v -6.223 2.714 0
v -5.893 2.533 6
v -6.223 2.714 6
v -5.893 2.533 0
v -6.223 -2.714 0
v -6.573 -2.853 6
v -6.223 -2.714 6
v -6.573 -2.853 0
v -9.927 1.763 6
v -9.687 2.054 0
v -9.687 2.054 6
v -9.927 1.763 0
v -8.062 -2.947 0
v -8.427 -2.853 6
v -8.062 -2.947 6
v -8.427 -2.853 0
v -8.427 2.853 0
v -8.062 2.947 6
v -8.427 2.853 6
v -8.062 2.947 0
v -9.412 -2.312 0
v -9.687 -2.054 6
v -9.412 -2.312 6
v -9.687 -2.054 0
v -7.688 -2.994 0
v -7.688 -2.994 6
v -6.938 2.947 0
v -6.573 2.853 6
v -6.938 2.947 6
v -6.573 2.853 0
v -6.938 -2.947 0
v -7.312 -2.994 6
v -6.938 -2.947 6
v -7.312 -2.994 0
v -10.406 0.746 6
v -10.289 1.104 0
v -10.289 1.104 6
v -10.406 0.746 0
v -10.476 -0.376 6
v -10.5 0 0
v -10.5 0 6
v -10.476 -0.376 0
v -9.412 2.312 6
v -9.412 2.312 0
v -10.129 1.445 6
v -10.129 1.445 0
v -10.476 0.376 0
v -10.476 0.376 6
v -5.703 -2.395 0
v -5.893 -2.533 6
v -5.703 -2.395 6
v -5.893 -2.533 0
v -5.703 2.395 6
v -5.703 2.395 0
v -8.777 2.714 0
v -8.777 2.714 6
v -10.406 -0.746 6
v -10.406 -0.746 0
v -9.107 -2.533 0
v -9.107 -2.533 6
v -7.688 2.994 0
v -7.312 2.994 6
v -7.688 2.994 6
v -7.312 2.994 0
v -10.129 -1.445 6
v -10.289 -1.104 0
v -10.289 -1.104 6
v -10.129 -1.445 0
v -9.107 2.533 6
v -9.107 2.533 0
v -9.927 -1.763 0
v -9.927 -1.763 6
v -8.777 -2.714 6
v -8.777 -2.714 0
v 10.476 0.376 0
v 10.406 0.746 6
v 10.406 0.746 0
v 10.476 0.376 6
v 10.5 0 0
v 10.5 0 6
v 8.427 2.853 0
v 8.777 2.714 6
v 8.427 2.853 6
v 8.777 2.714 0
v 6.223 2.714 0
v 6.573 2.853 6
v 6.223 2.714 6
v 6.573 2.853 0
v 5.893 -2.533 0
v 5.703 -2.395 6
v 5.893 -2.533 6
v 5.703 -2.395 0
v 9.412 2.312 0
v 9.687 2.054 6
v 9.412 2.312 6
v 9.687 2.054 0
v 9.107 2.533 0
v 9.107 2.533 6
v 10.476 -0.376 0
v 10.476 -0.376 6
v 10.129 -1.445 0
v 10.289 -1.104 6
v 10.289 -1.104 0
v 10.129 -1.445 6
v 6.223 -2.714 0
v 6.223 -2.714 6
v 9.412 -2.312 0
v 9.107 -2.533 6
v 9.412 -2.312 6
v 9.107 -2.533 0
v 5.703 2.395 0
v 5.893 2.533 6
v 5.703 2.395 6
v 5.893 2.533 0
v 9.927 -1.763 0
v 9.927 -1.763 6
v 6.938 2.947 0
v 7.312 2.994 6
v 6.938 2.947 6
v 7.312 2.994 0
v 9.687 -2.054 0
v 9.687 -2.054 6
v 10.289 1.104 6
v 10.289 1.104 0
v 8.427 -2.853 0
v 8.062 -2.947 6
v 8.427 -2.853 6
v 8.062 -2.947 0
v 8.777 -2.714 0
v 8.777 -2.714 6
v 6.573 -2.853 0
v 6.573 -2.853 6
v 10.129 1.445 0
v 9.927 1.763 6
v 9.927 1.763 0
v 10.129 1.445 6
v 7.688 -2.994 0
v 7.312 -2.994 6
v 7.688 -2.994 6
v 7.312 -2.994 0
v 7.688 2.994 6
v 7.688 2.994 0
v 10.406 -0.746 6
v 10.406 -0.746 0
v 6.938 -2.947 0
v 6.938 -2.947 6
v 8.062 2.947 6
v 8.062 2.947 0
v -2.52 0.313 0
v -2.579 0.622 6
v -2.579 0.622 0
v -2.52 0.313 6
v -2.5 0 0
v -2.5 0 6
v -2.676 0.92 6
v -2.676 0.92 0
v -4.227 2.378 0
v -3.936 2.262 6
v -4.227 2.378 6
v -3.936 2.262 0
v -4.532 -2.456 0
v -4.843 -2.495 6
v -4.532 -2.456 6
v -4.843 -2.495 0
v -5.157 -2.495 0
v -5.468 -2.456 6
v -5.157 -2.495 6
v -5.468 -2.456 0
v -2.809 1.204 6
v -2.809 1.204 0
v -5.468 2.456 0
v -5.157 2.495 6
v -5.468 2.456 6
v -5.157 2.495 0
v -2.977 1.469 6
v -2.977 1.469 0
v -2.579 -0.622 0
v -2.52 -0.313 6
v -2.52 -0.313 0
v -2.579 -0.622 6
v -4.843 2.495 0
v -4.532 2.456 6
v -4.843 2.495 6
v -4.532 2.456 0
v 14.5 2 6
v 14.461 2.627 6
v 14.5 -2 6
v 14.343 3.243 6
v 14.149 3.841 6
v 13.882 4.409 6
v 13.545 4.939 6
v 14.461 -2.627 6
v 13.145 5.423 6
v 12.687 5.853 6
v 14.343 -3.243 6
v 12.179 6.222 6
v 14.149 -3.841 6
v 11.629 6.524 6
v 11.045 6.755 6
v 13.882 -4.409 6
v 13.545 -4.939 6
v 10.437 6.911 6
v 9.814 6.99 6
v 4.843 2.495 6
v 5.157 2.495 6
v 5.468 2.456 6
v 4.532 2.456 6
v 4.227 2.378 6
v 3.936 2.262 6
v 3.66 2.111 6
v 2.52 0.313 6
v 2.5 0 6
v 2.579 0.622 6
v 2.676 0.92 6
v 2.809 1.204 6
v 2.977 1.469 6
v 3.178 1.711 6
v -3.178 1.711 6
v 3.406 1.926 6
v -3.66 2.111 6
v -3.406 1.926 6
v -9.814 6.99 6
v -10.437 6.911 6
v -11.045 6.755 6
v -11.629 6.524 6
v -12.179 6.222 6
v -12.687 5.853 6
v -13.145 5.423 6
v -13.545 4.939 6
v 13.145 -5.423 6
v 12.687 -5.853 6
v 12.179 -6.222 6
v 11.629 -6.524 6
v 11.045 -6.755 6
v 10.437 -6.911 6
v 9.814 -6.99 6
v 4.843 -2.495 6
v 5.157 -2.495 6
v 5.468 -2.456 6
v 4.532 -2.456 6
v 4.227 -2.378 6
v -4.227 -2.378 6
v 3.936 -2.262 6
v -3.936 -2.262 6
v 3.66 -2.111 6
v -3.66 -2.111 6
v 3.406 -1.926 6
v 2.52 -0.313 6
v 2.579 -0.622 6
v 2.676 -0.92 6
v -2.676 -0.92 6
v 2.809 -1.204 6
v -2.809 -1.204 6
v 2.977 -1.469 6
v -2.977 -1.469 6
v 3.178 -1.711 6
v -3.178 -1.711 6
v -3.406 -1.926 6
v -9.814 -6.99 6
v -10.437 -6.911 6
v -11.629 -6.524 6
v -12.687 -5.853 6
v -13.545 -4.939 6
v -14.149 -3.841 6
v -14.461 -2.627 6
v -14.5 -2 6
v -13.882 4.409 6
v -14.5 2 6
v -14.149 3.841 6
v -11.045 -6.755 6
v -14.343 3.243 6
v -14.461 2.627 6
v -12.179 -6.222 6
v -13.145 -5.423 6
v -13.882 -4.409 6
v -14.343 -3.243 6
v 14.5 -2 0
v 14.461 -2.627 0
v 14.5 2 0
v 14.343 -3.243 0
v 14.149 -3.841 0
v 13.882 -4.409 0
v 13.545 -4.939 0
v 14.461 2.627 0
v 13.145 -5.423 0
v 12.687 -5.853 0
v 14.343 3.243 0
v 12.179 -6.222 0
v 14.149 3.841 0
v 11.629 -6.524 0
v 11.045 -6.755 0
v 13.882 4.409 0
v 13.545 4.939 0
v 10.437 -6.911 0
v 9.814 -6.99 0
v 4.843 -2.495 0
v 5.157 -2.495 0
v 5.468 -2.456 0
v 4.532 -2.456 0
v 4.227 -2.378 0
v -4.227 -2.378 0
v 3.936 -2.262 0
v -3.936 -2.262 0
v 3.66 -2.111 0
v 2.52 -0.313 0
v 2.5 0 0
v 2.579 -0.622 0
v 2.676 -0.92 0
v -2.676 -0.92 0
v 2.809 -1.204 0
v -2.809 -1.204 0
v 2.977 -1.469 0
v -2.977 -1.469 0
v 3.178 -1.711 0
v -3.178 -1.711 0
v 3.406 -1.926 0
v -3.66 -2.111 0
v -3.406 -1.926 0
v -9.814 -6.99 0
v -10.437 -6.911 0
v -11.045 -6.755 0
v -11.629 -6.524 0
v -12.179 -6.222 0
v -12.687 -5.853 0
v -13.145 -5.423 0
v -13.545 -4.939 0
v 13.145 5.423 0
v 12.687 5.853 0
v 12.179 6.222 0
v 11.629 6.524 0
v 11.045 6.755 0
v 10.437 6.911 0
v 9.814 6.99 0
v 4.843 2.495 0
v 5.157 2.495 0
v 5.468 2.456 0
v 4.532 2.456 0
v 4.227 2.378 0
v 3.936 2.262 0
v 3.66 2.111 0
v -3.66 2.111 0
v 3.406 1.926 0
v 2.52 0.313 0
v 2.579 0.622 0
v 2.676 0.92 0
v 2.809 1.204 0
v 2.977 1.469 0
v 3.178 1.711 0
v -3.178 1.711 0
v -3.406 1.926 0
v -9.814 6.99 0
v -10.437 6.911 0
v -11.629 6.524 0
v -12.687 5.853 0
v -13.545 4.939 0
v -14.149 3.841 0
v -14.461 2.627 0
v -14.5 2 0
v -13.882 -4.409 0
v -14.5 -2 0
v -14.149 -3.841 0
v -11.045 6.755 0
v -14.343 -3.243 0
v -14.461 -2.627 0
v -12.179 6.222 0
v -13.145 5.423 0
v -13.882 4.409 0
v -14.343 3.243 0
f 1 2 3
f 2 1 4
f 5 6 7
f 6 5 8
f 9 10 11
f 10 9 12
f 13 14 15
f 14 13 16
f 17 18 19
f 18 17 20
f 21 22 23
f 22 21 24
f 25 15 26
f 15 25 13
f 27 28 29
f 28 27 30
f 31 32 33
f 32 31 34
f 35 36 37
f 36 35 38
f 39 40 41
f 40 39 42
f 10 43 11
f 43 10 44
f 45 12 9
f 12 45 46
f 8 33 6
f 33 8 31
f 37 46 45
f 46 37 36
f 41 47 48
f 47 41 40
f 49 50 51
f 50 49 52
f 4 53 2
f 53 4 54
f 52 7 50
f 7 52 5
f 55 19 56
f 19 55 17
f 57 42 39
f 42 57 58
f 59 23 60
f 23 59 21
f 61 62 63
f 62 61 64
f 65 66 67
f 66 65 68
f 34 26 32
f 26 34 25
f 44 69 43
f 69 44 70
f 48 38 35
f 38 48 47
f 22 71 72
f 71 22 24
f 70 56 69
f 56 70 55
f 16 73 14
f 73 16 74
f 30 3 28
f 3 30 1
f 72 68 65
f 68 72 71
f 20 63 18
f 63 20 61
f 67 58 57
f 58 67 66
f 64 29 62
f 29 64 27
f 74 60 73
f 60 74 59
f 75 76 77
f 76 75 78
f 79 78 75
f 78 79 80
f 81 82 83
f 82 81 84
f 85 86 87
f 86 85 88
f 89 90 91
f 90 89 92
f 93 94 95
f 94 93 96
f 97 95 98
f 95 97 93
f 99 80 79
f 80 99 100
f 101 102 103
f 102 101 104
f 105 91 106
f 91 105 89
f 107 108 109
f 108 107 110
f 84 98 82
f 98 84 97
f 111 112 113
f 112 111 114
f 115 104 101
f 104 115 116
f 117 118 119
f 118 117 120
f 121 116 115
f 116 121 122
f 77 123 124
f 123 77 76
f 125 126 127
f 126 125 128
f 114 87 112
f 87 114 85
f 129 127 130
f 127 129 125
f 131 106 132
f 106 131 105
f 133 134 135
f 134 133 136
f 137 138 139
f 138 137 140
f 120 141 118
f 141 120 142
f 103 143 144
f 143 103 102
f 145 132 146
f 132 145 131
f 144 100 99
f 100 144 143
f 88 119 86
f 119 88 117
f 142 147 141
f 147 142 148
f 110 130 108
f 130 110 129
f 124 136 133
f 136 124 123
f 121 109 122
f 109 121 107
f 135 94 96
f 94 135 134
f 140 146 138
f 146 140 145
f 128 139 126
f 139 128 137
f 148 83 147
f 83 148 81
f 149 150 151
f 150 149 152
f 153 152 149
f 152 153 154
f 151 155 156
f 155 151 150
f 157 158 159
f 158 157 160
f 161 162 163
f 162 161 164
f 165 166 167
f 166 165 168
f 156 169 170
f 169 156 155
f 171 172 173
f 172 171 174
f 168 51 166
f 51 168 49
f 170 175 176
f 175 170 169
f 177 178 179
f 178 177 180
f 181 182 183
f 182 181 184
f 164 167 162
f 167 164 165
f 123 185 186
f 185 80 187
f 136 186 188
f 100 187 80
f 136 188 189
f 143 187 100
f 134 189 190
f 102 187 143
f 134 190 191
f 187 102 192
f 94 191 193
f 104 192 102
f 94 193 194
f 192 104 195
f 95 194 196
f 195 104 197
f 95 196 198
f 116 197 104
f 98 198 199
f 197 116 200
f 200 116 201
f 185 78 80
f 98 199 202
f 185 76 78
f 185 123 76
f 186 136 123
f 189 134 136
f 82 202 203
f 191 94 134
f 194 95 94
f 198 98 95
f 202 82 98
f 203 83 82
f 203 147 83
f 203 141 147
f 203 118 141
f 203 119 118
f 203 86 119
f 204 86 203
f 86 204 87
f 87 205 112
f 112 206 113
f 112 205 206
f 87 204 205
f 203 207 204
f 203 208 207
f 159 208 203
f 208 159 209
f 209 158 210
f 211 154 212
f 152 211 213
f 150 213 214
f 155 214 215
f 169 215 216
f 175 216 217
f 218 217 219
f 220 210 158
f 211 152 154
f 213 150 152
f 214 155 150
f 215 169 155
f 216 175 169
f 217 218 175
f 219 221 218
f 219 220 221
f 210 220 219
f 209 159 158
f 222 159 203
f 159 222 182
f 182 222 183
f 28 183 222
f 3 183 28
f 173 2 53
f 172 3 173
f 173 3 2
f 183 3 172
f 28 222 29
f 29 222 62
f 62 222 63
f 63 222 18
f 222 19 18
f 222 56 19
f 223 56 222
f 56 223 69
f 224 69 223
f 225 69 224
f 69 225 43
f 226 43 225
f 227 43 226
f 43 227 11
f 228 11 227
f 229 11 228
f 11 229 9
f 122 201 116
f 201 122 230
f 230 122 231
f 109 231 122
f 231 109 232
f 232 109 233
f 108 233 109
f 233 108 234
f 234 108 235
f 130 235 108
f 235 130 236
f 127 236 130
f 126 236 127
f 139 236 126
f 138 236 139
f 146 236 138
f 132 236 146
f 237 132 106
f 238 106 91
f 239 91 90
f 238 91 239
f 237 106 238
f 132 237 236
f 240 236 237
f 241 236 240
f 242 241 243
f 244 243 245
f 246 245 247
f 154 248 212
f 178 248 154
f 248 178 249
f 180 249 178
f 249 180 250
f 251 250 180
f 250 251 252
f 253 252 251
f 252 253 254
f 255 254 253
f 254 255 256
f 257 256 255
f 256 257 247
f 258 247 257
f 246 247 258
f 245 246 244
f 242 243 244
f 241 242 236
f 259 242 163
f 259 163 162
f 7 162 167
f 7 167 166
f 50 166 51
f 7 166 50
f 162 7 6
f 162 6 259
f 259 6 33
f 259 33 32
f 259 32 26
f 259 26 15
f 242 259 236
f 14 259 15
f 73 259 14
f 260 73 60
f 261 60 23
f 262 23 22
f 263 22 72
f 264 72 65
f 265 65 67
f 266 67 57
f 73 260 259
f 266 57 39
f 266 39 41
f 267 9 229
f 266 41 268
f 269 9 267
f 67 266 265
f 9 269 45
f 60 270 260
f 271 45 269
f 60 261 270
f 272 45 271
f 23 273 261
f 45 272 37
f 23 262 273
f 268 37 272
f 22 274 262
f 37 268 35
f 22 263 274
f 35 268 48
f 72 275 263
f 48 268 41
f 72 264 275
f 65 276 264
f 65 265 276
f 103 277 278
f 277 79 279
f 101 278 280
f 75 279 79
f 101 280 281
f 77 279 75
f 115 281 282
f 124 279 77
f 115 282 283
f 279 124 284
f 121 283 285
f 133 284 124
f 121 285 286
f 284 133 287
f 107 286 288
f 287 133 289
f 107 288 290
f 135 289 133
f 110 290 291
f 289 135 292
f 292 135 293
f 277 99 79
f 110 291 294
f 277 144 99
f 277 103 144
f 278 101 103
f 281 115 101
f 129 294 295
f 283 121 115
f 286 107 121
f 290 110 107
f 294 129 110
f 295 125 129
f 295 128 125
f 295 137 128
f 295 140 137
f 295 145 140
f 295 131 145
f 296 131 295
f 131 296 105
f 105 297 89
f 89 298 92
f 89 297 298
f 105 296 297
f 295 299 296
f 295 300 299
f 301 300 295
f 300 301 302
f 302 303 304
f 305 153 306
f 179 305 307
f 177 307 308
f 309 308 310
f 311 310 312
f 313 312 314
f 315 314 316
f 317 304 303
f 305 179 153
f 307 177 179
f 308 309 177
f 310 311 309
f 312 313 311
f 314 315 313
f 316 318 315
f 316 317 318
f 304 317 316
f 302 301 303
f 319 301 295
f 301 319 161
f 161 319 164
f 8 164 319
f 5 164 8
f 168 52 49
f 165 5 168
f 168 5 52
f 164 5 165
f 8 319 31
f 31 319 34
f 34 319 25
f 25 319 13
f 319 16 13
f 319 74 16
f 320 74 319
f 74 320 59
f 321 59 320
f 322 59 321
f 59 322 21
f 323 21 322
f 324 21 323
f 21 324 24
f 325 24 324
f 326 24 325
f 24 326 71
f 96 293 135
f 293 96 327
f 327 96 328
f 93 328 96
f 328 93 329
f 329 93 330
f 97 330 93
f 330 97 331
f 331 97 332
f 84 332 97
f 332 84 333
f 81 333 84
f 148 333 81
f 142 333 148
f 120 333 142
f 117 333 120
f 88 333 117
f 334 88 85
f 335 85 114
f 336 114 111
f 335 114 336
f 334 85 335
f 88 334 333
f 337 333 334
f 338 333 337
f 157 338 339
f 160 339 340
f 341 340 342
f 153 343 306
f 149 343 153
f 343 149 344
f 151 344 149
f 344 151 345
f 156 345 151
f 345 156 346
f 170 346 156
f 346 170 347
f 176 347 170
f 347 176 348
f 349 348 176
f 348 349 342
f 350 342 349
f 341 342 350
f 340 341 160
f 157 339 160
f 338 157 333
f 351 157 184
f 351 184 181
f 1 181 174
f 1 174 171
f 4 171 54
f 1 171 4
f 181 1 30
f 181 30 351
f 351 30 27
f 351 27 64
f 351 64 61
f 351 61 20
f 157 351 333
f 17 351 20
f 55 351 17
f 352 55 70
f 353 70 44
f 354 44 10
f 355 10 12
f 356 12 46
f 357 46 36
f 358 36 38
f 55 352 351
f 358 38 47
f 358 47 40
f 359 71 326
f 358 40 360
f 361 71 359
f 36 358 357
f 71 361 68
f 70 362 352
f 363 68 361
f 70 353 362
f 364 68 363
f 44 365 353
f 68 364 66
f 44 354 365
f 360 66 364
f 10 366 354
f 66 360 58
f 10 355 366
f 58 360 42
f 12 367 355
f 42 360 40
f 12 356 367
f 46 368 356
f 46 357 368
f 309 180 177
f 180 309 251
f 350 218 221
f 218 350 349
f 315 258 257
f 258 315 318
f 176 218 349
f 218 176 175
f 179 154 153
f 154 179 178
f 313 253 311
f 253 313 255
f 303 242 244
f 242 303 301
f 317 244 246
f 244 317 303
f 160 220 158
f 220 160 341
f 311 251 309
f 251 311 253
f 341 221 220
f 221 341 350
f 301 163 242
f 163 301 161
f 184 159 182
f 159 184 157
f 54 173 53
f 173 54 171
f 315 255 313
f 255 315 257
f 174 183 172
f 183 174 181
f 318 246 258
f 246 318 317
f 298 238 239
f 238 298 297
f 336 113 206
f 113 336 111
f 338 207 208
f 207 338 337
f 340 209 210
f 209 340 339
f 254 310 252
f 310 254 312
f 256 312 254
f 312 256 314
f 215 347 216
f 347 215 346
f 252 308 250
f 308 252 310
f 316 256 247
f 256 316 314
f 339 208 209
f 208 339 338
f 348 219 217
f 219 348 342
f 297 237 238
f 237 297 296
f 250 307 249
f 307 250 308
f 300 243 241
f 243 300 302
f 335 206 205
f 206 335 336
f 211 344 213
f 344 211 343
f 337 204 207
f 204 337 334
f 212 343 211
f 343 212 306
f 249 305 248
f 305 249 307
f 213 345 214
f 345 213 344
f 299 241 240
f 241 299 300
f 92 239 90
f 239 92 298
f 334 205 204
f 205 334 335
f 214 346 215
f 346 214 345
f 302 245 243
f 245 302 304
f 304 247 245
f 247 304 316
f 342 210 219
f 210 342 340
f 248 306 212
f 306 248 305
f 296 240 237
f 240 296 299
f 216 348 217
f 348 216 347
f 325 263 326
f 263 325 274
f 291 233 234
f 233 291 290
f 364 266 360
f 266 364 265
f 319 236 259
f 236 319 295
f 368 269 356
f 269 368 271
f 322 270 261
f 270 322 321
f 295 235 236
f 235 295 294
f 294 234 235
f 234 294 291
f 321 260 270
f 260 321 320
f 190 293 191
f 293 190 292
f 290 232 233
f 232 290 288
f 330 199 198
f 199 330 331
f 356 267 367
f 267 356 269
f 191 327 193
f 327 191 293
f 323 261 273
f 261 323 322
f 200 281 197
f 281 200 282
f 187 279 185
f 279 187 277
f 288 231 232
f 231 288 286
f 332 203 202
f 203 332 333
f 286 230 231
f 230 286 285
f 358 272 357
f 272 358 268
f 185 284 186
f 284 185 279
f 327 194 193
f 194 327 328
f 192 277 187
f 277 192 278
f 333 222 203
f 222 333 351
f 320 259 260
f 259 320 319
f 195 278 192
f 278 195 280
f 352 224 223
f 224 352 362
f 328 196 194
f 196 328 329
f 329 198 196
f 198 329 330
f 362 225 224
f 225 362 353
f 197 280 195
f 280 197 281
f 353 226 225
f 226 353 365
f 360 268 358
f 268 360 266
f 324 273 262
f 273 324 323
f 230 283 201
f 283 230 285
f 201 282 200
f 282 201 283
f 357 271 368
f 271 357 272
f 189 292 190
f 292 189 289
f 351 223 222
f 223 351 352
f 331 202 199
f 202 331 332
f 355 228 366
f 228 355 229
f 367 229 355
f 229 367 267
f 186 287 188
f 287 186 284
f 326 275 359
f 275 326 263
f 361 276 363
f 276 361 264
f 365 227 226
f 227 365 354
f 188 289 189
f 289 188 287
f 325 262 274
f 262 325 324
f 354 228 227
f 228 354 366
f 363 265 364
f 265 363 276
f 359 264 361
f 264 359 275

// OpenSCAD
$fn = 50;


difference() {
	union() {
		hull() {
			translate(v = [-9.5000000000, 2.0000000000, 0]) {
				cylinder(h = 6, r = 5);
			}
			translate(v = [9.5000000000, 2.0000000000, 0]) {
				cylinder(h = 6, r = 5);
			}
			translate(v = [-9.5000000000, -2.0000000000, 0]) {
				cylinder(h = 6, r = 5);
			}
			translate(v = [9.5000000000, -2.0000000000, 0]) {
				cylinder(h = 6, r = 5);
			}
		}
	}
	union() {
		#translate(v = [-7.5000000000, 0.0000000000, -100.0000000000]) {
			cylinder(h = 200, r = 3.0000000000);
		}
		#translate(v = [-7.5000000000, 0.0000000000, -100.0000000000]) {
			cylinder(h = 200, r = 3.0000000000);
		}
		#translate(v = [7.5000000000, 0.0000000000, -100.0000000000]) {
			cylinder(h = 200, r = 3.0000000000);
		}
		#translate(v = [7.5000000000, 0.0000000000, -100.0000000000]) {
			cylinder(h = 200, r = 3.0000000000);
		}
		#translate(v = [-5.0000000000, 0, 0]) {
			cylinder(h = 6, r = 2.5000000000);
		}
		#translate(v = [5.0000000000, 0, 0]) {
			cylinder(h = 6, r = 2.5000000000);
		}
	}
}
